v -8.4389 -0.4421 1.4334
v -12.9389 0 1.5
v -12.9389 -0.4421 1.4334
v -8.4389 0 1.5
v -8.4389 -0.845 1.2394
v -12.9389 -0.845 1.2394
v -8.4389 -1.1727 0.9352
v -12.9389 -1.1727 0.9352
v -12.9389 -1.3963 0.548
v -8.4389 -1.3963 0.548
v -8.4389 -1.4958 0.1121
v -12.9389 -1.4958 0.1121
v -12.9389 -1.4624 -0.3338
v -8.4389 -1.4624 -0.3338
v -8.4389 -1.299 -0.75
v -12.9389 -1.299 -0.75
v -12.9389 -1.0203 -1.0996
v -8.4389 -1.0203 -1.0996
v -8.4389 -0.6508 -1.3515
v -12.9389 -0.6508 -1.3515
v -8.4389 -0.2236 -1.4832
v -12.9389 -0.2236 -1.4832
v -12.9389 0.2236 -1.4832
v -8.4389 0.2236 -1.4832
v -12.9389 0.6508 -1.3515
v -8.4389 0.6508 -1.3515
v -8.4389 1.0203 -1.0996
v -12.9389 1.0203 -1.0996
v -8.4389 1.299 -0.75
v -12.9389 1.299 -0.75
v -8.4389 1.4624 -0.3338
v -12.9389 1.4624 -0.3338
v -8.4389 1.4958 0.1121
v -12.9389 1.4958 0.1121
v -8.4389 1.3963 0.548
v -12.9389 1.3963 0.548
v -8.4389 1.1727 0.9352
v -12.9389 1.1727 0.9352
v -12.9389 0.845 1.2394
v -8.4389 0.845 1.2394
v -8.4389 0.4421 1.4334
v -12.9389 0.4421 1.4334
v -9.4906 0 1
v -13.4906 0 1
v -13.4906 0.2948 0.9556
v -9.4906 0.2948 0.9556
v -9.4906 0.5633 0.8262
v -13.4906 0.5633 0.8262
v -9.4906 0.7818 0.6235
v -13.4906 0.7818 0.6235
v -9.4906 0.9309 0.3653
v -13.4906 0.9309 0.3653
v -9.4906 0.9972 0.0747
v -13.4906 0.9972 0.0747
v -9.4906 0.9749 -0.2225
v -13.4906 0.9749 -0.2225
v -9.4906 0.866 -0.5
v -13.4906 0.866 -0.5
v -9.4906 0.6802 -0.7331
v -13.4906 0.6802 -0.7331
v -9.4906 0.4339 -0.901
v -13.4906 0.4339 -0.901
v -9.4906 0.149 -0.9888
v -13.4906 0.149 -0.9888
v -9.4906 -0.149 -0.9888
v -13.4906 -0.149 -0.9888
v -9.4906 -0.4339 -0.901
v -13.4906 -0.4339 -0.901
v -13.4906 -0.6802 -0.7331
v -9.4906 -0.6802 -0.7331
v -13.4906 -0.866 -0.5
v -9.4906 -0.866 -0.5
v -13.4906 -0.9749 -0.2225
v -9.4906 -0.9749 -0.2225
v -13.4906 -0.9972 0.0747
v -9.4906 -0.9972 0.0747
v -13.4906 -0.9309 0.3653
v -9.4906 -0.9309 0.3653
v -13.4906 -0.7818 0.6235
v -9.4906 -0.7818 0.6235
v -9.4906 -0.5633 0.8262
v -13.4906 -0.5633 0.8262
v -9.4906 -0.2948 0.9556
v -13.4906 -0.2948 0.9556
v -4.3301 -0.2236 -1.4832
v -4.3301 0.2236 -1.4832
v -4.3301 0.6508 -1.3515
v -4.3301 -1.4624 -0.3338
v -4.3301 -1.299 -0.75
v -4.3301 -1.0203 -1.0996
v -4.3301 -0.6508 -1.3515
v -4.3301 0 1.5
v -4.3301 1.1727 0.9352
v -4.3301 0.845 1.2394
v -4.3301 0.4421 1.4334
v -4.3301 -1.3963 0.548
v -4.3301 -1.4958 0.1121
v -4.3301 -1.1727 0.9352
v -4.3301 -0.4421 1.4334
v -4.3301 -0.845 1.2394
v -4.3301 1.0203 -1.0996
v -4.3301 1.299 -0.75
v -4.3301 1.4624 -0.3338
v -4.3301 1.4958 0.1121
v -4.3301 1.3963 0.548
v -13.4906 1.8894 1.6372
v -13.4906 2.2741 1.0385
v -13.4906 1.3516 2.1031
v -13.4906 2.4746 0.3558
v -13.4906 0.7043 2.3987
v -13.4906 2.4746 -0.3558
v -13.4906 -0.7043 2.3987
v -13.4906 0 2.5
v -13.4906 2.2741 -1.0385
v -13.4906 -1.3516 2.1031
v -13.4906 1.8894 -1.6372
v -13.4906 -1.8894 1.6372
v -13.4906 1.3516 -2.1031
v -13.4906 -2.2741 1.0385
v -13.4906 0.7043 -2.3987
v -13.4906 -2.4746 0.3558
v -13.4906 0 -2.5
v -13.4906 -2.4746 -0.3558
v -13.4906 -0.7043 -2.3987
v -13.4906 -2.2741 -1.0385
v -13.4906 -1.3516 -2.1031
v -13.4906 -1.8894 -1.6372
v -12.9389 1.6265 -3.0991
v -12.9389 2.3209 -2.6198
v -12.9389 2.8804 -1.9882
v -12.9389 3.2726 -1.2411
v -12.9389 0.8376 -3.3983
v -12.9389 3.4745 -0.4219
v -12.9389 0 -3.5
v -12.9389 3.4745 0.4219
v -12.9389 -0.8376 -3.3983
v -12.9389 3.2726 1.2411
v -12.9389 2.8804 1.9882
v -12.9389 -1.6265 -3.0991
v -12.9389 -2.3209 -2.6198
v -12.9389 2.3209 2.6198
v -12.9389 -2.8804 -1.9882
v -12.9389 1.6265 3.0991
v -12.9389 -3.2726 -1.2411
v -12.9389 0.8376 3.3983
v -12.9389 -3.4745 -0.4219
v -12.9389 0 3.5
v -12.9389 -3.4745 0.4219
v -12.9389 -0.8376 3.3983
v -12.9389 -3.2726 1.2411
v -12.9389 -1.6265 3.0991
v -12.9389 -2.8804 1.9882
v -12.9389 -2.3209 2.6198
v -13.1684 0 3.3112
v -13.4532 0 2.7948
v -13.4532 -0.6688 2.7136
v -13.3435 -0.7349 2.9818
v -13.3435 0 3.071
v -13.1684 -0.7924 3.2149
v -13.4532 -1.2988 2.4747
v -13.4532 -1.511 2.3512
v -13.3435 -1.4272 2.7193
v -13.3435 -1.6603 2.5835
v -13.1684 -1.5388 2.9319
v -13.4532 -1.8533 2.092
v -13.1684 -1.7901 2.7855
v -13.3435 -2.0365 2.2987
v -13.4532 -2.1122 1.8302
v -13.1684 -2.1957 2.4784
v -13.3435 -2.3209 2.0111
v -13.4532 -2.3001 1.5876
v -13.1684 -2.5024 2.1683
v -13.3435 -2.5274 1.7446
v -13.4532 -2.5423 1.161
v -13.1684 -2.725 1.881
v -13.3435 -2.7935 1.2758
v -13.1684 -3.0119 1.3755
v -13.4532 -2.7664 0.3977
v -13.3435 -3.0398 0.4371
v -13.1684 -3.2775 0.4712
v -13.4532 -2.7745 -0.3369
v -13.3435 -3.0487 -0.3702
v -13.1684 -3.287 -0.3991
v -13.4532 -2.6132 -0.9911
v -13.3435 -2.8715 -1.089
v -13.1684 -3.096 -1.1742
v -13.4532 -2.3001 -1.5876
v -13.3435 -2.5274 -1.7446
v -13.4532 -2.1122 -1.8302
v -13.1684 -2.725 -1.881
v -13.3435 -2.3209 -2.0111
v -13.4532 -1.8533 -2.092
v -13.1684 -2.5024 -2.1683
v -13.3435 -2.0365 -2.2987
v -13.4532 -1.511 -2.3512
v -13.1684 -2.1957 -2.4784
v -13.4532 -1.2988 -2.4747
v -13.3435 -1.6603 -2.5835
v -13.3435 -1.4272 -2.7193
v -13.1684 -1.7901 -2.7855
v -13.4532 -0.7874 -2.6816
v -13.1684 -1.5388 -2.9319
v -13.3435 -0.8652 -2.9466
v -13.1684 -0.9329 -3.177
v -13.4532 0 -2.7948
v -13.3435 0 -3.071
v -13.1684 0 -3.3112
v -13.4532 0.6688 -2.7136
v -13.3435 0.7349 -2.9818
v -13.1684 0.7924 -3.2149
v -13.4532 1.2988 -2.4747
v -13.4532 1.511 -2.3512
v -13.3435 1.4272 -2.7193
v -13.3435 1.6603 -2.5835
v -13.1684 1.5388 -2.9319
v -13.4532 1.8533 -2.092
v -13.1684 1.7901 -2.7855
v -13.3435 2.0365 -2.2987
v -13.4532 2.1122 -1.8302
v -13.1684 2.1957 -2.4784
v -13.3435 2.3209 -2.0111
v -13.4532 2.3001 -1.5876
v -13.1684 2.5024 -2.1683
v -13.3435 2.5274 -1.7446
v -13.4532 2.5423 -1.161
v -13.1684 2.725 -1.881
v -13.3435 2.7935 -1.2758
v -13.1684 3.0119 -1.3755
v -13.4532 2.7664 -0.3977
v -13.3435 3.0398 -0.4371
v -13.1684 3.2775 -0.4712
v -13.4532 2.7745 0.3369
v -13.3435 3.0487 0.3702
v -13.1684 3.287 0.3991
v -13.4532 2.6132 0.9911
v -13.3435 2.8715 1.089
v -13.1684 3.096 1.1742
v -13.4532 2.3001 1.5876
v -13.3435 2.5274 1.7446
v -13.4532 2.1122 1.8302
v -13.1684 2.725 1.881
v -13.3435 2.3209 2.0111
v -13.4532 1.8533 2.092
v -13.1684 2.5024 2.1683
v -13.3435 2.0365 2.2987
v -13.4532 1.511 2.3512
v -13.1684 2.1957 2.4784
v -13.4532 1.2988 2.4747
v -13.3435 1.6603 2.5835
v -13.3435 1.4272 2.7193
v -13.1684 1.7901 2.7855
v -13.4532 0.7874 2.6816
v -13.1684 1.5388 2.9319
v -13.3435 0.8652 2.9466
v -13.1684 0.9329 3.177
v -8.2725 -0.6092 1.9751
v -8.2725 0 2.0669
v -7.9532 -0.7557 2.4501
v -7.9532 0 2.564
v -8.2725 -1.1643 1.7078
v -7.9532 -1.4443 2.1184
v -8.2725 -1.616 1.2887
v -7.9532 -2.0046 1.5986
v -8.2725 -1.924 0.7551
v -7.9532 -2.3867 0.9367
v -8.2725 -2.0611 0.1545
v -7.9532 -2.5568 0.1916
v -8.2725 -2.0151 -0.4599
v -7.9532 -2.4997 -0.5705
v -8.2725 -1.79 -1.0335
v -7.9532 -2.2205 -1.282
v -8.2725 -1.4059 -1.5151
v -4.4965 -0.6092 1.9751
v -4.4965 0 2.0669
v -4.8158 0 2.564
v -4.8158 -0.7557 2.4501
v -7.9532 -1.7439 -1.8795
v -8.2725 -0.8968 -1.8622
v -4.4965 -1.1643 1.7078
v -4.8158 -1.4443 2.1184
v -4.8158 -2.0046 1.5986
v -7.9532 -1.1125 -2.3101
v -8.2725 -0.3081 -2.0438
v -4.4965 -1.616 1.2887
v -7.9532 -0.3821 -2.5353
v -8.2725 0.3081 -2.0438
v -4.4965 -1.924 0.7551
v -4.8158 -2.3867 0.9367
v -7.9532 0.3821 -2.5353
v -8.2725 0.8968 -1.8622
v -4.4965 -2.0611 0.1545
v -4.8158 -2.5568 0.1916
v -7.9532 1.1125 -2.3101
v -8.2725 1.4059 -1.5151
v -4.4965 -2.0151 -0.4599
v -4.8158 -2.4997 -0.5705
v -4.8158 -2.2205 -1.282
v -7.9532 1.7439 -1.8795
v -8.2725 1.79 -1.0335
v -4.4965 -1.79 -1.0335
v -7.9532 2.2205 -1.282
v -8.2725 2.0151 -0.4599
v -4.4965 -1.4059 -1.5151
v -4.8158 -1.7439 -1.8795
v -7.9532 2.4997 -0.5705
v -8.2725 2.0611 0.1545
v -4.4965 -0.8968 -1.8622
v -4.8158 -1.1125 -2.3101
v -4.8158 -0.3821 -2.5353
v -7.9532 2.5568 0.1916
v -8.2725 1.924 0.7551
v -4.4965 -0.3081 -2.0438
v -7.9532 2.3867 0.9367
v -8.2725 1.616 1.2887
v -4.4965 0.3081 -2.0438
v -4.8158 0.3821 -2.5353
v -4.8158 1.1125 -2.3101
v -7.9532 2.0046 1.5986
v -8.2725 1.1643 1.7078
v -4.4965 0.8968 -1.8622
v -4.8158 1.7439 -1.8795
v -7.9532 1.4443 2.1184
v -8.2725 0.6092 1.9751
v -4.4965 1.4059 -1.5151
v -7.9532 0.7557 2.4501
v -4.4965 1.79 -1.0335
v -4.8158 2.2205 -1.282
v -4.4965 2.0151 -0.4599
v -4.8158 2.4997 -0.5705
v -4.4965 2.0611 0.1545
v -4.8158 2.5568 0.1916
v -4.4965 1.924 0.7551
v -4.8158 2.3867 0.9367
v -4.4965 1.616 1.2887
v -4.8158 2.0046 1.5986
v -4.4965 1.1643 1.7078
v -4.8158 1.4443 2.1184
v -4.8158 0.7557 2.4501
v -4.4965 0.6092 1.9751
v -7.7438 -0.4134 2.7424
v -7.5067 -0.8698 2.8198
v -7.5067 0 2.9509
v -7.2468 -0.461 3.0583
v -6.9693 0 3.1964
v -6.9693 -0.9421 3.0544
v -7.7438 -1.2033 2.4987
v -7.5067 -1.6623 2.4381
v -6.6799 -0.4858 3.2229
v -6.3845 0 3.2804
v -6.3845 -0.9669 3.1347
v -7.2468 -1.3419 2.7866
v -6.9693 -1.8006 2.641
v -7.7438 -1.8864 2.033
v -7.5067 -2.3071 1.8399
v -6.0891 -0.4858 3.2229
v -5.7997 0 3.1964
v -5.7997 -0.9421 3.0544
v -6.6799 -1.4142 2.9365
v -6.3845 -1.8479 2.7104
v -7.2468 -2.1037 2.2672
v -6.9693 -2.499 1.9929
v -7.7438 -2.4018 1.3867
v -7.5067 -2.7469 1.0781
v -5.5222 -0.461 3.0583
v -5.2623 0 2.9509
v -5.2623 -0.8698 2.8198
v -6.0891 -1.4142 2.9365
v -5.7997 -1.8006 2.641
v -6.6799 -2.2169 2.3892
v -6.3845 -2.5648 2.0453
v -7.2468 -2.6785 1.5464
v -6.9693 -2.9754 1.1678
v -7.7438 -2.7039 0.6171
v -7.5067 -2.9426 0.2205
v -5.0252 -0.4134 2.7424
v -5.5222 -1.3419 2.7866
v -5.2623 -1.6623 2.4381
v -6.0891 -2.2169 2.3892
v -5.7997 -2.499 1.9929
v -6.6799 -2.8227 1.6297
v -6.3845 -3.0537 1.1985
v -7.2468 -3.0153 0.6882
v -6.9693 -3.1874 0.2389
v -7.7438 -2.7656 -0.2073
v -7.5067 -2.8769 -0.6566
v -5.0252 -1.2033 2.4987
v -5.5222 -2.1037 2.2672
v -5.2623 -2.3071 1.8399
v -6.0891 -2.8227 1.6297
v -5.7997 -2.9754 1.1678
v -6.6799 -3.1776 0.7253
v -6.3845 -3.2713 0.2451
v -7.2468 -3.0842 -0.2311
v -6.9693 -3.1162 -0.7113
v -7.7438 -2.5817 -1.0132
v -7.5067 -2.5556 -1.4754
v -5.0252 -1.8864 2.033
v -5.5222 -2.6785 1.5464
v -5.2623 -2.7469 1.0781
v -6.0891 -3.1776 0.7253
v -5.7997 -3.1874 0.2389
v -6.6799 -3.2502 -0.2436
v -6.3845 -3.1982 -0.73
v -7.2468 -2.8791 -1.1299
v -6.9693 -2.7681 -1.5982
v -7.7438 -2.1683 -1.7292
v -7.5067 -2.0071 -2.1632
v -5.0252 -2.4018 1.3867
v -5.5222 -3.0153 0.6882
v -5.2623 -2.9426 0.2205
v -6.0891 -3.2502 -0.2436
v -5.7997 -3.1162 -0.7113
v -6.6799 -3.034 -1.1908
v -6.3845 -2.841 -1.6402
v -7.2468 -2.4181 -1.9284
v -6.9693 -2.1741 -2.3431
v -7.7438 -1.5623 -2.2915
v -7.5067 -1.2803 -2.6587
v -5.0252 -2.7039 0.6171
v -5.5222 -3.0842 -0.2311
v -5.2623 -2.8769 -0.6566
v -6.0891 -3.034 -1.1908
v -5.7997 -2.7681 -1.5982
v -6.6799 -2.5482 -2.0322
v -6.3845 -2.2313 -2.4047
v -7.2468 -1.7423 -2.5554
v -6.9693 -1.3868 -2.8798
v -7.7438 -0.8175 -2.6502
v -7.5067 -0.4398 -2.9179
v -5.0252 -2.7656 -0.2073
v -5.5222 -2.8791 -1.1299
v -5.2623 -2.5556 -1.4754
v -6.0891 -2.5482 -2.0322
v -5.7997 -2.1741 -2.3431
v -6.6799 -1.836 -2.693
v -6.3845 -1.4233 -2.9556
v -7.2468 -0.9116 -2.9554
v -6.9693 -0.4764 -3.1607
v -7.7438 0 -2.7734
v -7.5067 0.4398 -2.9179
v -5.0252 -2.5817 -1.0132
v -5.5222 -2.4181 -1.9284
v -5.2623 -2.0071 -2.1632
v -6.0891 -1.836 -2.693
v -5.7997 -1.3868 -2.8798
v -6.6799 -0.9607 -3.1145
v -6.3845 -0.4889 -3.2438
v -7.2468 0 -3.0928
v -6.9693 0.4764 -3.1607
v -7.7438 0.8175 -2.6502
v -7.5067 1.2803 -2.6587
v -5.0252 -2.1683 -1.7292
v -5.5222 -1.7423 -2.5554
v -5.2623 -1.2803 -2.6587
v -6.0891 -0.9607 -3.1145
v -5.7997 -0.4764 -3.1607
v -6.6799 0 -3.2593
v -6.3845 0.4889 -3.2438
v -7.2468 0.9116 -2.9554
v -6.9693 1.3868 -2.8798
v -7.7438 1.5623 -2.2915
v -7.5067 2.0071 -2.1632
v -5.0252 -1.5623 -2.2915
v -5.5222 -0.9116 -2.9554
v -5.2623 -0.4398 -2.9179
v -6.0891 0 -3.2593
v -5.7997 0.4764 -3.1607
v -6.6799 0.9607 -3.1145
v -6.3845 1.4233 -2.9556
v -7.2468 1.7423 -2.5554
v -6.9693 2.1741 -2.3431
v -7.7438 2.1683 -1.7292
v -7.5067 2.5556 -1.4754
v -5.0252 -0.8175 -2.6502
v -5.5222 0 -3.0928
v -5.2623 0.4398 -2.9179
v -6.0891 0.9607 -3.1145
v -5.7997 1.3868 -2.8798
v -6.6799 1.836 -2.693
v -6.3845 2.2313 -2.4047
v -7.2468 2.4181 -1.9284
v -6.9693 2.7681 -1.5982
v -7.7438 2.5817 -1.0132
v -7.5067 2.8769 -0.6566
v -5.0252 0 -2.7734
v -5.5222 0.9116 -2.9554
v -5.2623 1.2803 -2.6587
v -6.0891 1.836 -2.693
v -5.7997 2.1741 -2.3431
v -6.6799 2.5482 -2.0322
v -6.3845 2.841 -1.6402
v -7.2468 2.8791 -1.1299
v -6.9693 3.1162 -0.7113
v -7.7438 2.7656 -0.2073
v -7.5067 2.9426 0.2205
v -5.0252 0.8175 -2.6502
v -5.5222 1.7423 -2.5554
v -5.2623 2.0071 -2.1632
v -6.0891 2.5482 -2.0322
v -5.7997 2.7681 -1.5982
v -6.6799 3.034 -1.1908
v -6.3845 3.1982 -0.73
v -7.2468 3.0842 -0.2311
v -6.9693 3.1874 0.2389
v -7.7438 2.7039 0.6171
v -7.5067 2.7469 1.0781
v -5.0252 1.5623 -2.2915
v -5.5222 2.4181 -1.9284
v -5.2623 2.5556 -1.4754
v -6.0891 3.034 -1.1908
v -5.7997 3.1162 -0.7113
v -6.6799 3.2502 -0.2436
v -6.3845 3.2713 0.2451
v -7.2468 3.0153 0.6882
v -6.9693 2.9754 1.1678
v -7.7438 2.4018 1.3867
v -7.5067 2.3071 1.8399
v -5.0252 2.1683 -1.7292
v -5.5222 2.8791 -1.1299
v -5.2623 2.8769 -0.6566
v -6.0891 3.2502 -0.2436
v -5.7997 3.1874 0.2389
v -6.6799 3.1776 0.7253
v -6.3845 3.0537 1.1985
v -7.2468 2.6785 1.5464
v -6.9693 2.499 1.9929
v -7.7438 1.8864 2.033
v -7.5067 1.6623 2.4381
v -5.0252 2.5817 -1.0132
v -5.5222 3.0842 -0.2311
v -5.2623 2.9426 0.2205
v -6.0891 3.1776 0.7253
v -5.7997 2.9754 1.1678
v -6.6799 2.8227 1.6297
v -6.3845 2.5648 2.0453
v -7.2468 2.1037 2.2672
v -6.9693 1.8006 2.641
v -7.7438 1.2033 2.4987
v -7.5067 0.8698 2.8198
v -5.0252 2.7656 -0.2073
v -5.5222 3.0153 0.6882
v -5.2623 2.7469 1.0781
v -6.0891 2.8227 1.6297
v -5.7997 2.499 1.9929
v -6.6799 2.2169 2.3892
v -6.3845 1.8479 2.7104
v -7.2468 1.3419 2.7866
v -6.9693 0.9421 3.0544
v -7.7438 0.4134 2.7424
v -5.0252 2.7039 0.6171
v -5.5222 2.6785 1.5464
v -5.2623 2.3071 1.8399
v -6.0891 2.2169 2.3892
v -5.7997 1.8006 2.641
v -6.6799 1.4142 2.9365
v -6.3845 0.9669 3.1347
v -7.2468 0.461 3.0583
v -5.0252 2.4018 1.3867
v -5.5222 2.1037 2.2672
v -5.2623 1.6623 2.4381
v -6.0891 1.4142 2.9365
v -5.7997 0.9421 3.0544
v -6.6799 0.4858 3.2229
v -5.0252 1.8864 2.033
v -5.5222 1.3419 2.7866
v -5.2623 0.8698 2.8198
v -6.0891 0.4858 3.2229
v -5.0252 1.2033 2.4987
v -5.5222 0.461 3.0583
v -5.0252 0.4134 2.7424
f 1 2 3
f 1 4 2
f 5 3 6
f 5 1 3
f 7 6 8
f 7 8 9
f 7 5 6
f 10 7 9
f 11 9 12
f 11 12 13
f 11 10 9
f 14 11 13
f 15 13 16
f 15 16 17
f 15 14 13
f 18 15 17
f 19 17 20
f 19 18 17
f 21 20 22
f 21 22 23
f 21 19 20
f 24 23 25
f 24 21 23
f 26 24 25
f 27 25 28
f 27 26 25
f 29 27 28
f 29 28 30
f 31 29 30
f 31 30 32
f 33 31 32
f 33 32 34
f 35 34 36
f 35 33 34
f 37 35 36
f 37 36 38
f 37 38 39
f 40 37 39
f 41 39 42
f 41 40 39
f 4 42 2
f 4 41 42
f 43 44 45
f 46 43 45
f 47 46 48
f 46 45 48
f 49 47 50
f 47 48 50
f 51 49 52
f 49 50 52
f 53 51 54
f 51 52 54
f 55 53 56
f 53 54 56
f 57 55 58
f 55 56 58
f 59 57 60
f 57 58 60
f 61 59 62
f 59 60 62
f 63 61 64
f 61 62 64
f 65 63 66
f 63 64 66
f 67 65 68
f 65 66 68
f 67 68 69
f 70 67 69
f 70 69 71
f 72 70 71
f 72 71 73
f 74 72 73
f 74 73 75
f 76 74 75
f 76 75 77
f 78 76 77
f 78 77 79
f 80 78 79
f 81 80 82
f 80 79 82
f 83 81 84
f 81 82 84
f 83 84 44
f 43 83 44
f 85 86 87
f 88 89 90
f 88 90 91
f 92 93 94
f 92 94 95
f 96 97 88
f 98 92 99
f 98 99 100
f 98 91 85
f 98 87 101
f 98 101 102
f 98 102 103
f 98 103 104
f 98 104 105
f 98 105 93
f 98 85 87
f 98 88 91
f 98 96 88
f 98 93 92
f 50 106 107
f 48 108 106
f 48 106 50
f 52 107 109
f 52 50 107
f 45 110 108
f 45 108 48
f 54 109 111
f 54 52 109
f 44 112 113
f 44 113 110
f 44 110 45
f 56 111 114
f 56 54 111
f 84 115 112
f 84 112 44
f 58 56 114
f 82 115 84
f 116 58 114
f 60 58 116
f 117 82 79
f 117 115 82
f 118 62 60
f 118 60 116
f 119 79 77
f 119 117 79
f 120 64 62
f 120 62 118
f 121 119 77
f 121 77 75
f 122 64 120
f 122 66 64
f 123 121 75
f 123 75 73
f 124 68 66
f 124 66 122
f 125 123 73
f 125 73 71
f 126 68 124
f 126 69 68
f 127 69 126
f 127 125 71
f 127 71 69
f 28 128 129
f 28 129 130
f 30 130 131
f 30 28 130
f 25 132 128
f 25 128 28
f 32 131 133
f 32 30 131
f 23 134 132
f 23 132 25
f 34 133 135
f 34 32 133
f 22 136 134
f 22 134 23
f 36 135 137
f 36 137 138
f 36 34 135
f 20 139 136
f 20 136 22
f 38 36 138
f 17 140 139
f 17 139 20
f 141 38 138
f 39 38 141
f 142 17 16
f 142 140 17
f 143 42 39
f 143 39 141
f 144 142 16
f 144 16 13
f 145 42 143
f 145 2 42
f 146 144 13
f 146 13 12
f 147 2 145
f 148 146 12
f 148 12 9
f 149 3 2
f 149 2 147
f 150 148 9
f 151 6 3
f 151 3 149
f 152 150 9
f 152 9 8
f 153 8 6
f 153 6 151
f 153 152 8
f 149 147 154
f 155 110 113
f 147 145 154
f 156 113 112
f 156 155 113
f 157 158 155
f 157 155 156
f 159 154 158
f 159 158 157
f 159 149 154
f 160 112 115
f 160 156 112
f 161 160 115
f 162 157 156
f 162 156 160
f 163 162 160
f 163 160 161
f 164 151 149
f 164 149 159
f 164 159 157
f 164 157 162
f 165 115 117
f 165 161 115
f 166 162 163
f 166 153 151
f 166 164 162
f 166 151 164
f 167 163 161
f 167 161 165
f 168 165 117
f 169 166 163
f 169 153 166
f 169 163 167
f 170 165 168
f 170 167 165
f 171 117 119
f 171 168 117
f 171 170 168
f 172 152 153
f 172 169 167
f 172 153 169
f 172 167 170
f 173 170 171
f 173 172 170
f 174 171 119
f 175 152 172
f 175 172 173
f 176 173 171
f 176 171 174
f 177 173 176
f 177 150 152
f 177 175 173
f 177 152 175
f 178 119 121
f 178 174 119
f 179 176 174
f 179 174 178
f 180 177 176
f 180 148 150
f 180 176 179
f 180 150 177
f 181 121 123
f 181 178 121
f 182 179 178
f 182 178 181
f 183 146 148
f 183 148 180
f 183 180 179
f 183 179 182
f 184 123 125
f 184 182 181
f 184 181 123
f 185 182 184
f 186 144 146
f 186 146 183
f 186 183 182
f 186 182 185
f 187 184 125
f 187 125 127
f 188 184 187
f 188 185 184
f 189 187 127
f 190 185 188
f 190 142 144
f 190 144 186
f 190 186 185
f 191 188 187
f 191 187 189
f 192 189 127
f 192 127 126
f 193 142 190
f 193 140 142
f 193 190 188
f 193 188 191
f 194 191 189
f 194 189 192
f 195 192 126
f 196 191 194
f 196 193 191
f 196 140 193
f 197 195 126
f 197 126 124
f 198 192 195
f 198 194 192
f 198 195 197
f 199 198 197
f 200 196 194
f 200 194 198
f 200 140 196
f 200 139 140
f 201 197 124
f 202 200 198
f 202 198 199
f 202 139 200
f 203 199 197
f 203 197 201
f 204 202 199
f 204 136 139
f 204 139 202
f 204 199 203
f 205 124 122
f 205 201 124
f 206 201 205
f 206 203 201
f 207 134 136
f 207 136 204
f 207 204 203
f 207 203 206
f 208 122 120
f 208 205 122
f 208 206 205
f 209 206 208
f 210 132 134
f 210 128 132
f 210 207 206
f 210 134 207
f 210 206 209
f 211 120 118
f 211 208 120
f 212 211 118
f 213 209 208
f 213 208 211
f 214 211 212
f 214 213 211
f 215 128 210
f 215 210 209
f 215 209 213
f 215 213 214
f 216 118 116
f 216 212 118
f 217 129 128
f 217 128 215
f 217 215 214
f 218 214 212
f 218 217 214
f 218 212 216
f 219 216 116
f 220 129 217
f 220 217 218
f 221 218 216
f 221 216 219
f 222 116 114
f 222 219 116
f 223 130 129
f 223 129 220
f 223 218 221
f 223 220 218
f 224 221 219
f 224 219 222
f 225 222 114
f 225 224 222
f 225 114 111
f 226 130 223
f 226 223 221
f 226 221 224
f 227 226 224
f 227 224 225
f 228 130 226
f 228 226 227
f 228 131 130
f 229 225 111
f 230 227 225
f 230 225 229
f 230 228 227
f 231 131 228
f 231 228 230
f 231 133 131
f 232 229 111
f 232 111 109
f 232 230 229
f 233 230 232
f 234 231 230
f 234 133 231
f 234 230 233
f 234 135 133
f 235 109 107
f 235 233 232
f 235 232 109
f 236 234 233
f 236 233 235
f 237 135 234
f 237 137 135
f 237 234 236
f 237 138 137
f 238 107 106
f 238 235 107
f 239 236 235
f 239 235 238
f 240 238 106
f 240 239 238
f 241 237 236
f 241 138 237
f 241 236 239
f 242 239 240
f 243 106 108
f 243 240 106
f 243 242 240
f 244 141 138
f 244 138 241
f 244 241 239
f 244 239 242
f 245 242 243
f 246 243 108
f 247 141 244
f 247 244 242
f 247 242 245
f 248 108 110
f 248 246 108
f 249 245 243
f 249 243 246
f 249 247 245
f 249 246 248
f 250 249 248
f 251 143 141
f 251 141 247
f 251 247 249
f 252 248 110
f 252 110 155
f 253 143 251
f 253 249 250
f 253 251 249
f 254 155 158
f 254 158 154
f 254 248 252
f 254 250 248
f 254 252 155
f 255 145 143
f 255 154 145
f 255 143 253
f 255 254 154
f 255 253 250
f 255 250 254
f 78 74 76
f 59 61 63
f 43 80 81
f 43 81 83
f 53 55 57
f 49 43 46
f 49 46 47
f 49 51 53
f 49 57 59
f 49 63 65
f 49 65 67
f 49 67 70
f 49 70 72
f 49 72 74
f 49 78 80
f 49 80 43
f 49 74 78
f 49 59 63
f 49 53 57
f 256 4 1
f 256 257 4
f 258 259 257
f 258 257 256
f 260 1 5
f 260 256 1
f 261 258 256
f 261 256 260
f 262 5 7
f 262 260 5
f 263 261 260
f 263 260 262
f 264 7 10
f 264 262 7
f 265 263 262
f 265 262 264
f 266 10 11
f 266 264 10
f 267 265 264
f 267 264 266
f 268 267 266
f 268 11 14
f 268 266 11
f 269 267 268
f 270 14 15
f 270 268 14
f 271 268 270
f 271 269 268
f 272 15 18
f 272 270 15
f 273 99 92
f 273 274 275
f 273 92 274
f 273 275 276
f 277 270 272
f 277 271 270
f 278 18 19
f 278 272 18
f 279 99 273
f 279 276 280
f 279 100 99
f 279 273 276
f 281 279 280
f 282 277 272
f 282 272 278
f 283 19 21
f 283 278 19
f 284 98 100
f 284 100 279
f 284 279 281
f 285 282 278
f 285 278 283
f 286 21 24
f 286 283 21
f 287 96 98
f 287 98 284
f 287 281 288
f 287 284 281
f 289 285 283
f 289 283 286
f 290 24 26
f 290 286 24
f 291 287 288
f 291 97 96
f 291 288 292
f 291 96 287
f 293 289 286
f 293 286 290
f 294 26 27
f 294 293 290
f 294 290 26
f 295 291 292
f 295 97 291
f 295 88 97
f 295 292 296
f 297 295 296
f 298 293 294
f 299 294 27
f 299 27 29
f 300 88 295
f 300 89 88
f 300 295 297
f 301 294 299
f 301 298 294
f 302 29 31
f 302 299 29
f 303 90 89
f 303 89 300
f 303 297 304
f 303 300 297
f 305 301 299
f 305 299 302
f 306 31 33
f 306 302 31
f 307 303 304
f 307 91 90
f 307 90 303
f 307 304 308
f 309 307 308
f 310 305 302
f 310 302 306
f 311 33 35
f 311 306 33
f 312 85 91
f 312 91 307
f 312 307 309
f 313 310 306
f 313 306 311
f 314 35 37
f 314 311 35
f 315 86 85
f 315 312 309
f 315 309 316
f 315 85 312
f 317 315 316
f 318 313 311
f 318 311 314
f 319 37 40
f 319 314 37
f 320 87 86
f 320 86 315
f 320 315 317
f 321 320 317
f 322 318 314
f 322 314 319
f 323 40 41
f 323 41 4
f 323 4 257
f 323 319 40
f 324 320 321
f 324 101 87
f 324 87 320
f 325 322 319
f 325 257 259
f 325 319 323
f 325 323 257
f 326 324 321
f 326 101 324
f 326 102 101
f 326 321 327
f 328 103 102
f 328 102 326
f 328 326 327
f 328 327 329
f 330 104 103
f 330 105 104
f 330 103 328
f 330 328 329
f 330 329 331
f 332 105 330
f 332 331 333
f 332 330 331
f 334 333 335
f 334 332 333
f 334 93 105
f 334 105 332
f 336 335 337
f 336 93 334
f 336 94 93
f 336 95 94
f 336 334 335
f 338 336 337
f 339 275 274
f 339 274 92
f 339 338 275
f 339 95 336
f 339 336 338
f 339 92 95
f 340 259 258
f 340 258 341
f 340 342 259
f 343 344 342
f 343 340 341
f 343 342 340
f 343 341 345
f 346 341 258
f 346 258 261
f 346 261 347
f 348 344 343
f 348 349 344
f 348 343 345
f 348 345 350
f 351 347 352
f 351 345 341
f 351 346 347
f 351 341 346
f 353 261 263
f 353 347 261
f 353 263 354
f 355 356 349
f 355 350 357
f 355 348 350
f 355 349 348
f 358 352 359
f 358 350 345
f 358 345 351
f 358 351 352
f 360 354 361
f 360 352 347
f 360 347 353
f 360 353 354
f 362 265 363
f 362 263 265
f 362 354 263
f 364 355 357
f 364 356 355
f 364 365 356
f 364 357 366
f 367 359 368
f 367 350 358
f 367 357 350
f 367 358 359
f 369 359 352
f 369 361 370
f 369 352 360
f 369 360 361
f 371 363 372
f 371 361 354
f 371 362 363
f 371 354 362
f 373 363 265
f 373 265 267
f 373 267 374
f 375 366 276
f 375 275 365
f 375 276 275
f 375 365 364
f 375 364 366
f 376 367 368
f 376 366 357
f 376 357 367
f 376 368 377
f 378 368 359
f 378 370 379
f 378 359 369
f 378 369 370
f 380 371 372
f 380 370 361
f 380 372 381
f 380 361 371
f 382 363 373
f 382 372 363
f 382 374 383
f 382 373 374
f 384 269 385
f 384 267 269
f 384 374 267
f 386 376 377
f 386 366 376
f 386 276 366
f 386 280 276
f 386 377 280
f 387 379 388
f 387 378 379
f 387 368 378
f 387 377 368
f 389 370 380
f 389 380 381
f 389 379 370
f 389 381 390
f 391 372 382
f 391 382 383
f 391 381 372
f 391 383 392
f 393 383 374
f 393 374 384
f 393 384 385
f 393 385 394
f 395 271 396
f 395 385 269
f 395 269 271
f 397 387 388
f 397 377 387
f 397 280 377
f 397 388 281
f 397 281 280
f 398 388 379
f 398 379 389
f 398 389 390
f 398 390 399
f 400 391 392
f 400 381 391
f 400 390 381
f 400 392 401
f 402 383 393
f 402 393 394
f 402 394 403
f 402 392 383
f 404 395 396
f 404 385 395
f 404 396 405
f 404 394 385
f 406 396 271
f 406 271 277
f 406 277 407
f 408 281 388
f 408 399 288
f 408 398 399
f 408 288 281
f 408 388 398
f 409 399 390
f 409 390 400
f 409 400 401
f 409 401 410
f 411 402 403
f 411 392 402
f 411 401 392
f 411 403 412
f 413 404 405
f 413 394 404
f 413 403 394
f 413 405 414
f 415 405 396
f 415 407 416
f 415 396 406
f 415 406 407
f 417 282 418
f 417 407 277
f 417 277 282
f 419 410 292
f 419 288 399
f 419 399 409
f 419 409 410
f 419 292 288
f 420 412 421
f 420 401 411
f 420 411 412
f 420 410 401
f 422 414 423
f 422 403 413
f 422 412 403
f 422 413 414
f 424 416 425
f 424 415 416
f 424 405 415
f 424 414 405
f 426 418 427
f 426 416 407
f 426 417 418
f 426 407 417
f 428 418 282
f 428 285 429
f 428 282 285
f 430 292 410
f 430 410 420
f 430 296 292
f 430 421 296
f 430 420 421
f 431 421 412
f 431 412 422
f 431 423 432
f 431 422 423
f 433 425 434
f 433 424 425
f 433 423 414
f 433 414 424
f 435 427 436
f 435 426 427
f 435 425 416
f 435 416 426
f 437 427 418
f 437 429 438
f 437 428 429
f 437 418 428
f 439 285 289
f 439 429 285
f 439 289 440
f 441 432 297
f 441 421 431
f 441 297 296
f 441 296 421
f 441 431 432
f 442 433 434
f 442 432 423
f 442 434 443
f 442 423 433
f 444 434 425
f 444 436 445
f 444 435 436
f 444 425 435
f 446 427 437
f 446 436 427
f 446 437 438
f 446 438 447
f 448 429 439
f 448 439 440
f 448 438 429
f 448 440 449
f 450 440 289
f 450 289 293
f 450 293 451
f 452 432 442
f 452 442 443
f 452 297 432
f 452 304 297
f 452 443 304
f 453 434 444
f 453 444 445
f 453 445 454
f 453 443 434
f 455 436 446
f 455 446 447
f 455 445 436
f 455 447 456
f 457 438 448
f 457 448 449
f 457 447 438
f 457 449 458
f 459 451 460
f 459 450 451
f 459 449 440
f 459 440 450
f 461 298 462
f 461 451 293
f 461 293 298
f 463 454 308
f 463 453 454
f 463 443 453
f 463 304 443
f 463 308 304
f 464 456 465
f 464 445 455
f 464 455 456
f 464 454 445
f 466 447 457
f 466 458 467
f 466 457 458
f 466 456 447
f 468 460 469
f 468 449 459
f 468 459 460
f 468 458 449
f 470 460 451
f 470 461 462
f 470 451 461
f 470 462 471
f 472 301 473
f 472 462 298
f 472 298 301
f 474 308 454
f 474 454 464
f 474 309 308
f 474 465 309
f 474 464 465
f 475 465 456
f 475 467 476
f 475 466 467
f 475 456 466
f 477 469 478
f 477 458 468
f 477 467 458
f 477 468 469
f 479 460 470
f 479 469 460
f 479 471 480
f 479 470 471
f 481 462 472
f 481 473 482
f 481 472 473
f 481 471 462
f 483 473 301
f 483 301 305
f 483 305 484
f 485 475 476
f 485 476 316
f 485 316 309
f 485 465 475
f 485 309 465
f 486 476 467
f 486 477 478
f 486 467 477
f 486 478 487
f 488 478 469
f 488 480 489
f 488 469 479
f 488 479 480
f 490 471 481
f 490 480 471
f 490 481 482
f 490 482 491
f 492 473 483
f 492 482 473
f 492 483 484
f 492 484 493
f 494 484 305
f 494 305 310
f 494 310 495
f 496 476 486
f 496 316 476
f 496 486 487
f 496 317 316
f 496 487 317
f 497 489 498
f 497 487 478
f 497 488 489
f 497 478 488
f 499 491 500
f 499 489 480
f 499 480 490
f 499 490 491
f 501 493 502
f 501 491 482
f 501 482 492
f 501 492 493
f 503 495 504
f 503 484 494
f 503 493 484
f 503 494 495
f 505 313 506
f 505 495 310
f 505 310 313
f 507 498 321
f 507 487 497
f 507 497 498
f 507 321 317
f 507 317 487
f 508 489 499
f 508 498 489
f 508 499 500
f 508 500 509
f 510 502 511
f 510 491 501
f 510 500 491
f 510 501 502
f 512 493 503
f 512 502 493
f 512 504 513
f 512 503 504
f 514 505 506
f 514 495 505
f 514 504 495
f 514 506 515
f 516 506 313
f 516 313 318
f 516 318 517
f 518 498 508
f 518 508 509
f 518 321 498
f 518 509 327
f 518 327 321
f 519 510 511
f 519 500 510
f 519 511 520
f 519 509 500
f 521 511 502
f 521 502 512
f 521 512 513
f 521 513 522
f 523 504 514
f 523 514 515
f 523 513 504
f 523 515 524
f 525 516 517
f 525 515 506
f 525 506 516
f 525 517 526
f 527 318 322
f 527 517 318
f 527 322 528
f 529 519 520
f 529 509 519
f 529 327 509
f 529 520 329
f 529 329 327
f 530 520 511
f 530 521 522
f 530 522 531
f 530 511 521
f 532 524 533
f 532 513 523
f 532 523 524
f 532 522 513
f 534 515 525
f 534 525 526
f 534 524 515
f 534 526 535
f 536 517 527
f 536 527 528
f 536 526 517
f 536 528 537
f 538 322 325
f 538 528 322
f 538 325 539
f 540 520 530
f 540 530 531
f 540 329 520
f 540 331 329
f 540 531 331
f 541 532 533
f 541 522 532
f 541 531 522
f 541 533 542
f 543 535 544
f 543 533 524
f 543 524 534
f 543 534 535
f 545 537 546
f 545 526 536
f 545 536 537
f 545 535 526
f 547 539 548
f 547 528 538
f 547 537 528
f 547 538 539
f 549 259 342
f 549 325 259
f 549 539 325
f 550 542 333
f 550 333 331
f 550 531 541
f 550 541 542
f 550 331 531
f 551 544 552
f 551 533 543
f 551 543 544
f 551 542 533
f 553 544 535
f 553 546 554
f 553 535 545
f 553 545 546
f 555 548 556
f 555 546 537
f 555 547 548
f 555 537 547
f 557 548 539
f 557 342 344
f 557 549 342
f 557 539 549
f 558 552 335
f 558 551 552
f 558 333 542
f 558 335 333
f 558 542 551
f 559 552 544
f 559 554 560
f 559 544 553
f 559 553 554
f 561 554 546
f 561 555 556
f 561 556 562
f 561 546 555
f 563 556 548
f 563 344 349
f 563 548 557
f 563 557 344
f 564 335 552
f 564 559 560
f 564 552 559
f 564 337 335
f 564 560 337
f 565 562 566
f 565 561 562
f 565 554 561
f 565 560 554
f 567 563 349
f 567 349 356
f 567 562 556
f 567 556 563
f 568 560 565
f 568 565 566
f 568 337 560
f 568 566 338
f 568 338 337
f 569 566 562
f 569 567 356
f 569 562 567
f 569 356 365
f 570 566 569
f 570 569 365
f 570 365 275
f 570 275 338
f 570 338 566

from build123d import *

# Parameters (mm, degrees)
ESQUISSE2_R      = 1
EXTRUSION1_DEPTH = 4


with BuildPart() as part:
    # Esquisse1 → Révolution1 (revolve)
    with BuildSketch(Plane.XY, mode=Mode.PRIVATE) as r_volution1_sk:
        with BuildLine():
            Line((-13.490599357, 0), (-13.490599357, 2.5))
            ThreePointArc((-13.490599357, 2.5), (-13.343527434, 3.071044042), (-12.938906334, 3.5))
            Line((-12.938906334, 3.5), (-12.938906334, 1.5))
            Line((-12.938906334, 1.5), (-8.438906334, 1.5))
            ThreePointArc((-8.438906334, 1.5), (-6.384495581, 3.280449293), (-4.330084828, 1.5))
            Line((-4.330084828, 1.5), (-4.330084828, 0))
            Line((-4.330084828, 0), (-13.490599357, 0))
        make_face()
    revolve(r_volution1_sk.sketch.rotate(Axis((-91.106565723, 0, 0), (1, 0, 0)), 90), axis=Axis((-91.106565723, 0, 0), (1, 0, 0)))

    # Esquisse2 → Extrusion1 (cut)
    with BuildSketch(Plane.ZY.offset(13.490599357)):
        Circle(ESQUISSE2_R)
    extrude(amount=-EXTRUSION1_DEPTH, mode=Mode.SUBTRACT)


solid = part.part
